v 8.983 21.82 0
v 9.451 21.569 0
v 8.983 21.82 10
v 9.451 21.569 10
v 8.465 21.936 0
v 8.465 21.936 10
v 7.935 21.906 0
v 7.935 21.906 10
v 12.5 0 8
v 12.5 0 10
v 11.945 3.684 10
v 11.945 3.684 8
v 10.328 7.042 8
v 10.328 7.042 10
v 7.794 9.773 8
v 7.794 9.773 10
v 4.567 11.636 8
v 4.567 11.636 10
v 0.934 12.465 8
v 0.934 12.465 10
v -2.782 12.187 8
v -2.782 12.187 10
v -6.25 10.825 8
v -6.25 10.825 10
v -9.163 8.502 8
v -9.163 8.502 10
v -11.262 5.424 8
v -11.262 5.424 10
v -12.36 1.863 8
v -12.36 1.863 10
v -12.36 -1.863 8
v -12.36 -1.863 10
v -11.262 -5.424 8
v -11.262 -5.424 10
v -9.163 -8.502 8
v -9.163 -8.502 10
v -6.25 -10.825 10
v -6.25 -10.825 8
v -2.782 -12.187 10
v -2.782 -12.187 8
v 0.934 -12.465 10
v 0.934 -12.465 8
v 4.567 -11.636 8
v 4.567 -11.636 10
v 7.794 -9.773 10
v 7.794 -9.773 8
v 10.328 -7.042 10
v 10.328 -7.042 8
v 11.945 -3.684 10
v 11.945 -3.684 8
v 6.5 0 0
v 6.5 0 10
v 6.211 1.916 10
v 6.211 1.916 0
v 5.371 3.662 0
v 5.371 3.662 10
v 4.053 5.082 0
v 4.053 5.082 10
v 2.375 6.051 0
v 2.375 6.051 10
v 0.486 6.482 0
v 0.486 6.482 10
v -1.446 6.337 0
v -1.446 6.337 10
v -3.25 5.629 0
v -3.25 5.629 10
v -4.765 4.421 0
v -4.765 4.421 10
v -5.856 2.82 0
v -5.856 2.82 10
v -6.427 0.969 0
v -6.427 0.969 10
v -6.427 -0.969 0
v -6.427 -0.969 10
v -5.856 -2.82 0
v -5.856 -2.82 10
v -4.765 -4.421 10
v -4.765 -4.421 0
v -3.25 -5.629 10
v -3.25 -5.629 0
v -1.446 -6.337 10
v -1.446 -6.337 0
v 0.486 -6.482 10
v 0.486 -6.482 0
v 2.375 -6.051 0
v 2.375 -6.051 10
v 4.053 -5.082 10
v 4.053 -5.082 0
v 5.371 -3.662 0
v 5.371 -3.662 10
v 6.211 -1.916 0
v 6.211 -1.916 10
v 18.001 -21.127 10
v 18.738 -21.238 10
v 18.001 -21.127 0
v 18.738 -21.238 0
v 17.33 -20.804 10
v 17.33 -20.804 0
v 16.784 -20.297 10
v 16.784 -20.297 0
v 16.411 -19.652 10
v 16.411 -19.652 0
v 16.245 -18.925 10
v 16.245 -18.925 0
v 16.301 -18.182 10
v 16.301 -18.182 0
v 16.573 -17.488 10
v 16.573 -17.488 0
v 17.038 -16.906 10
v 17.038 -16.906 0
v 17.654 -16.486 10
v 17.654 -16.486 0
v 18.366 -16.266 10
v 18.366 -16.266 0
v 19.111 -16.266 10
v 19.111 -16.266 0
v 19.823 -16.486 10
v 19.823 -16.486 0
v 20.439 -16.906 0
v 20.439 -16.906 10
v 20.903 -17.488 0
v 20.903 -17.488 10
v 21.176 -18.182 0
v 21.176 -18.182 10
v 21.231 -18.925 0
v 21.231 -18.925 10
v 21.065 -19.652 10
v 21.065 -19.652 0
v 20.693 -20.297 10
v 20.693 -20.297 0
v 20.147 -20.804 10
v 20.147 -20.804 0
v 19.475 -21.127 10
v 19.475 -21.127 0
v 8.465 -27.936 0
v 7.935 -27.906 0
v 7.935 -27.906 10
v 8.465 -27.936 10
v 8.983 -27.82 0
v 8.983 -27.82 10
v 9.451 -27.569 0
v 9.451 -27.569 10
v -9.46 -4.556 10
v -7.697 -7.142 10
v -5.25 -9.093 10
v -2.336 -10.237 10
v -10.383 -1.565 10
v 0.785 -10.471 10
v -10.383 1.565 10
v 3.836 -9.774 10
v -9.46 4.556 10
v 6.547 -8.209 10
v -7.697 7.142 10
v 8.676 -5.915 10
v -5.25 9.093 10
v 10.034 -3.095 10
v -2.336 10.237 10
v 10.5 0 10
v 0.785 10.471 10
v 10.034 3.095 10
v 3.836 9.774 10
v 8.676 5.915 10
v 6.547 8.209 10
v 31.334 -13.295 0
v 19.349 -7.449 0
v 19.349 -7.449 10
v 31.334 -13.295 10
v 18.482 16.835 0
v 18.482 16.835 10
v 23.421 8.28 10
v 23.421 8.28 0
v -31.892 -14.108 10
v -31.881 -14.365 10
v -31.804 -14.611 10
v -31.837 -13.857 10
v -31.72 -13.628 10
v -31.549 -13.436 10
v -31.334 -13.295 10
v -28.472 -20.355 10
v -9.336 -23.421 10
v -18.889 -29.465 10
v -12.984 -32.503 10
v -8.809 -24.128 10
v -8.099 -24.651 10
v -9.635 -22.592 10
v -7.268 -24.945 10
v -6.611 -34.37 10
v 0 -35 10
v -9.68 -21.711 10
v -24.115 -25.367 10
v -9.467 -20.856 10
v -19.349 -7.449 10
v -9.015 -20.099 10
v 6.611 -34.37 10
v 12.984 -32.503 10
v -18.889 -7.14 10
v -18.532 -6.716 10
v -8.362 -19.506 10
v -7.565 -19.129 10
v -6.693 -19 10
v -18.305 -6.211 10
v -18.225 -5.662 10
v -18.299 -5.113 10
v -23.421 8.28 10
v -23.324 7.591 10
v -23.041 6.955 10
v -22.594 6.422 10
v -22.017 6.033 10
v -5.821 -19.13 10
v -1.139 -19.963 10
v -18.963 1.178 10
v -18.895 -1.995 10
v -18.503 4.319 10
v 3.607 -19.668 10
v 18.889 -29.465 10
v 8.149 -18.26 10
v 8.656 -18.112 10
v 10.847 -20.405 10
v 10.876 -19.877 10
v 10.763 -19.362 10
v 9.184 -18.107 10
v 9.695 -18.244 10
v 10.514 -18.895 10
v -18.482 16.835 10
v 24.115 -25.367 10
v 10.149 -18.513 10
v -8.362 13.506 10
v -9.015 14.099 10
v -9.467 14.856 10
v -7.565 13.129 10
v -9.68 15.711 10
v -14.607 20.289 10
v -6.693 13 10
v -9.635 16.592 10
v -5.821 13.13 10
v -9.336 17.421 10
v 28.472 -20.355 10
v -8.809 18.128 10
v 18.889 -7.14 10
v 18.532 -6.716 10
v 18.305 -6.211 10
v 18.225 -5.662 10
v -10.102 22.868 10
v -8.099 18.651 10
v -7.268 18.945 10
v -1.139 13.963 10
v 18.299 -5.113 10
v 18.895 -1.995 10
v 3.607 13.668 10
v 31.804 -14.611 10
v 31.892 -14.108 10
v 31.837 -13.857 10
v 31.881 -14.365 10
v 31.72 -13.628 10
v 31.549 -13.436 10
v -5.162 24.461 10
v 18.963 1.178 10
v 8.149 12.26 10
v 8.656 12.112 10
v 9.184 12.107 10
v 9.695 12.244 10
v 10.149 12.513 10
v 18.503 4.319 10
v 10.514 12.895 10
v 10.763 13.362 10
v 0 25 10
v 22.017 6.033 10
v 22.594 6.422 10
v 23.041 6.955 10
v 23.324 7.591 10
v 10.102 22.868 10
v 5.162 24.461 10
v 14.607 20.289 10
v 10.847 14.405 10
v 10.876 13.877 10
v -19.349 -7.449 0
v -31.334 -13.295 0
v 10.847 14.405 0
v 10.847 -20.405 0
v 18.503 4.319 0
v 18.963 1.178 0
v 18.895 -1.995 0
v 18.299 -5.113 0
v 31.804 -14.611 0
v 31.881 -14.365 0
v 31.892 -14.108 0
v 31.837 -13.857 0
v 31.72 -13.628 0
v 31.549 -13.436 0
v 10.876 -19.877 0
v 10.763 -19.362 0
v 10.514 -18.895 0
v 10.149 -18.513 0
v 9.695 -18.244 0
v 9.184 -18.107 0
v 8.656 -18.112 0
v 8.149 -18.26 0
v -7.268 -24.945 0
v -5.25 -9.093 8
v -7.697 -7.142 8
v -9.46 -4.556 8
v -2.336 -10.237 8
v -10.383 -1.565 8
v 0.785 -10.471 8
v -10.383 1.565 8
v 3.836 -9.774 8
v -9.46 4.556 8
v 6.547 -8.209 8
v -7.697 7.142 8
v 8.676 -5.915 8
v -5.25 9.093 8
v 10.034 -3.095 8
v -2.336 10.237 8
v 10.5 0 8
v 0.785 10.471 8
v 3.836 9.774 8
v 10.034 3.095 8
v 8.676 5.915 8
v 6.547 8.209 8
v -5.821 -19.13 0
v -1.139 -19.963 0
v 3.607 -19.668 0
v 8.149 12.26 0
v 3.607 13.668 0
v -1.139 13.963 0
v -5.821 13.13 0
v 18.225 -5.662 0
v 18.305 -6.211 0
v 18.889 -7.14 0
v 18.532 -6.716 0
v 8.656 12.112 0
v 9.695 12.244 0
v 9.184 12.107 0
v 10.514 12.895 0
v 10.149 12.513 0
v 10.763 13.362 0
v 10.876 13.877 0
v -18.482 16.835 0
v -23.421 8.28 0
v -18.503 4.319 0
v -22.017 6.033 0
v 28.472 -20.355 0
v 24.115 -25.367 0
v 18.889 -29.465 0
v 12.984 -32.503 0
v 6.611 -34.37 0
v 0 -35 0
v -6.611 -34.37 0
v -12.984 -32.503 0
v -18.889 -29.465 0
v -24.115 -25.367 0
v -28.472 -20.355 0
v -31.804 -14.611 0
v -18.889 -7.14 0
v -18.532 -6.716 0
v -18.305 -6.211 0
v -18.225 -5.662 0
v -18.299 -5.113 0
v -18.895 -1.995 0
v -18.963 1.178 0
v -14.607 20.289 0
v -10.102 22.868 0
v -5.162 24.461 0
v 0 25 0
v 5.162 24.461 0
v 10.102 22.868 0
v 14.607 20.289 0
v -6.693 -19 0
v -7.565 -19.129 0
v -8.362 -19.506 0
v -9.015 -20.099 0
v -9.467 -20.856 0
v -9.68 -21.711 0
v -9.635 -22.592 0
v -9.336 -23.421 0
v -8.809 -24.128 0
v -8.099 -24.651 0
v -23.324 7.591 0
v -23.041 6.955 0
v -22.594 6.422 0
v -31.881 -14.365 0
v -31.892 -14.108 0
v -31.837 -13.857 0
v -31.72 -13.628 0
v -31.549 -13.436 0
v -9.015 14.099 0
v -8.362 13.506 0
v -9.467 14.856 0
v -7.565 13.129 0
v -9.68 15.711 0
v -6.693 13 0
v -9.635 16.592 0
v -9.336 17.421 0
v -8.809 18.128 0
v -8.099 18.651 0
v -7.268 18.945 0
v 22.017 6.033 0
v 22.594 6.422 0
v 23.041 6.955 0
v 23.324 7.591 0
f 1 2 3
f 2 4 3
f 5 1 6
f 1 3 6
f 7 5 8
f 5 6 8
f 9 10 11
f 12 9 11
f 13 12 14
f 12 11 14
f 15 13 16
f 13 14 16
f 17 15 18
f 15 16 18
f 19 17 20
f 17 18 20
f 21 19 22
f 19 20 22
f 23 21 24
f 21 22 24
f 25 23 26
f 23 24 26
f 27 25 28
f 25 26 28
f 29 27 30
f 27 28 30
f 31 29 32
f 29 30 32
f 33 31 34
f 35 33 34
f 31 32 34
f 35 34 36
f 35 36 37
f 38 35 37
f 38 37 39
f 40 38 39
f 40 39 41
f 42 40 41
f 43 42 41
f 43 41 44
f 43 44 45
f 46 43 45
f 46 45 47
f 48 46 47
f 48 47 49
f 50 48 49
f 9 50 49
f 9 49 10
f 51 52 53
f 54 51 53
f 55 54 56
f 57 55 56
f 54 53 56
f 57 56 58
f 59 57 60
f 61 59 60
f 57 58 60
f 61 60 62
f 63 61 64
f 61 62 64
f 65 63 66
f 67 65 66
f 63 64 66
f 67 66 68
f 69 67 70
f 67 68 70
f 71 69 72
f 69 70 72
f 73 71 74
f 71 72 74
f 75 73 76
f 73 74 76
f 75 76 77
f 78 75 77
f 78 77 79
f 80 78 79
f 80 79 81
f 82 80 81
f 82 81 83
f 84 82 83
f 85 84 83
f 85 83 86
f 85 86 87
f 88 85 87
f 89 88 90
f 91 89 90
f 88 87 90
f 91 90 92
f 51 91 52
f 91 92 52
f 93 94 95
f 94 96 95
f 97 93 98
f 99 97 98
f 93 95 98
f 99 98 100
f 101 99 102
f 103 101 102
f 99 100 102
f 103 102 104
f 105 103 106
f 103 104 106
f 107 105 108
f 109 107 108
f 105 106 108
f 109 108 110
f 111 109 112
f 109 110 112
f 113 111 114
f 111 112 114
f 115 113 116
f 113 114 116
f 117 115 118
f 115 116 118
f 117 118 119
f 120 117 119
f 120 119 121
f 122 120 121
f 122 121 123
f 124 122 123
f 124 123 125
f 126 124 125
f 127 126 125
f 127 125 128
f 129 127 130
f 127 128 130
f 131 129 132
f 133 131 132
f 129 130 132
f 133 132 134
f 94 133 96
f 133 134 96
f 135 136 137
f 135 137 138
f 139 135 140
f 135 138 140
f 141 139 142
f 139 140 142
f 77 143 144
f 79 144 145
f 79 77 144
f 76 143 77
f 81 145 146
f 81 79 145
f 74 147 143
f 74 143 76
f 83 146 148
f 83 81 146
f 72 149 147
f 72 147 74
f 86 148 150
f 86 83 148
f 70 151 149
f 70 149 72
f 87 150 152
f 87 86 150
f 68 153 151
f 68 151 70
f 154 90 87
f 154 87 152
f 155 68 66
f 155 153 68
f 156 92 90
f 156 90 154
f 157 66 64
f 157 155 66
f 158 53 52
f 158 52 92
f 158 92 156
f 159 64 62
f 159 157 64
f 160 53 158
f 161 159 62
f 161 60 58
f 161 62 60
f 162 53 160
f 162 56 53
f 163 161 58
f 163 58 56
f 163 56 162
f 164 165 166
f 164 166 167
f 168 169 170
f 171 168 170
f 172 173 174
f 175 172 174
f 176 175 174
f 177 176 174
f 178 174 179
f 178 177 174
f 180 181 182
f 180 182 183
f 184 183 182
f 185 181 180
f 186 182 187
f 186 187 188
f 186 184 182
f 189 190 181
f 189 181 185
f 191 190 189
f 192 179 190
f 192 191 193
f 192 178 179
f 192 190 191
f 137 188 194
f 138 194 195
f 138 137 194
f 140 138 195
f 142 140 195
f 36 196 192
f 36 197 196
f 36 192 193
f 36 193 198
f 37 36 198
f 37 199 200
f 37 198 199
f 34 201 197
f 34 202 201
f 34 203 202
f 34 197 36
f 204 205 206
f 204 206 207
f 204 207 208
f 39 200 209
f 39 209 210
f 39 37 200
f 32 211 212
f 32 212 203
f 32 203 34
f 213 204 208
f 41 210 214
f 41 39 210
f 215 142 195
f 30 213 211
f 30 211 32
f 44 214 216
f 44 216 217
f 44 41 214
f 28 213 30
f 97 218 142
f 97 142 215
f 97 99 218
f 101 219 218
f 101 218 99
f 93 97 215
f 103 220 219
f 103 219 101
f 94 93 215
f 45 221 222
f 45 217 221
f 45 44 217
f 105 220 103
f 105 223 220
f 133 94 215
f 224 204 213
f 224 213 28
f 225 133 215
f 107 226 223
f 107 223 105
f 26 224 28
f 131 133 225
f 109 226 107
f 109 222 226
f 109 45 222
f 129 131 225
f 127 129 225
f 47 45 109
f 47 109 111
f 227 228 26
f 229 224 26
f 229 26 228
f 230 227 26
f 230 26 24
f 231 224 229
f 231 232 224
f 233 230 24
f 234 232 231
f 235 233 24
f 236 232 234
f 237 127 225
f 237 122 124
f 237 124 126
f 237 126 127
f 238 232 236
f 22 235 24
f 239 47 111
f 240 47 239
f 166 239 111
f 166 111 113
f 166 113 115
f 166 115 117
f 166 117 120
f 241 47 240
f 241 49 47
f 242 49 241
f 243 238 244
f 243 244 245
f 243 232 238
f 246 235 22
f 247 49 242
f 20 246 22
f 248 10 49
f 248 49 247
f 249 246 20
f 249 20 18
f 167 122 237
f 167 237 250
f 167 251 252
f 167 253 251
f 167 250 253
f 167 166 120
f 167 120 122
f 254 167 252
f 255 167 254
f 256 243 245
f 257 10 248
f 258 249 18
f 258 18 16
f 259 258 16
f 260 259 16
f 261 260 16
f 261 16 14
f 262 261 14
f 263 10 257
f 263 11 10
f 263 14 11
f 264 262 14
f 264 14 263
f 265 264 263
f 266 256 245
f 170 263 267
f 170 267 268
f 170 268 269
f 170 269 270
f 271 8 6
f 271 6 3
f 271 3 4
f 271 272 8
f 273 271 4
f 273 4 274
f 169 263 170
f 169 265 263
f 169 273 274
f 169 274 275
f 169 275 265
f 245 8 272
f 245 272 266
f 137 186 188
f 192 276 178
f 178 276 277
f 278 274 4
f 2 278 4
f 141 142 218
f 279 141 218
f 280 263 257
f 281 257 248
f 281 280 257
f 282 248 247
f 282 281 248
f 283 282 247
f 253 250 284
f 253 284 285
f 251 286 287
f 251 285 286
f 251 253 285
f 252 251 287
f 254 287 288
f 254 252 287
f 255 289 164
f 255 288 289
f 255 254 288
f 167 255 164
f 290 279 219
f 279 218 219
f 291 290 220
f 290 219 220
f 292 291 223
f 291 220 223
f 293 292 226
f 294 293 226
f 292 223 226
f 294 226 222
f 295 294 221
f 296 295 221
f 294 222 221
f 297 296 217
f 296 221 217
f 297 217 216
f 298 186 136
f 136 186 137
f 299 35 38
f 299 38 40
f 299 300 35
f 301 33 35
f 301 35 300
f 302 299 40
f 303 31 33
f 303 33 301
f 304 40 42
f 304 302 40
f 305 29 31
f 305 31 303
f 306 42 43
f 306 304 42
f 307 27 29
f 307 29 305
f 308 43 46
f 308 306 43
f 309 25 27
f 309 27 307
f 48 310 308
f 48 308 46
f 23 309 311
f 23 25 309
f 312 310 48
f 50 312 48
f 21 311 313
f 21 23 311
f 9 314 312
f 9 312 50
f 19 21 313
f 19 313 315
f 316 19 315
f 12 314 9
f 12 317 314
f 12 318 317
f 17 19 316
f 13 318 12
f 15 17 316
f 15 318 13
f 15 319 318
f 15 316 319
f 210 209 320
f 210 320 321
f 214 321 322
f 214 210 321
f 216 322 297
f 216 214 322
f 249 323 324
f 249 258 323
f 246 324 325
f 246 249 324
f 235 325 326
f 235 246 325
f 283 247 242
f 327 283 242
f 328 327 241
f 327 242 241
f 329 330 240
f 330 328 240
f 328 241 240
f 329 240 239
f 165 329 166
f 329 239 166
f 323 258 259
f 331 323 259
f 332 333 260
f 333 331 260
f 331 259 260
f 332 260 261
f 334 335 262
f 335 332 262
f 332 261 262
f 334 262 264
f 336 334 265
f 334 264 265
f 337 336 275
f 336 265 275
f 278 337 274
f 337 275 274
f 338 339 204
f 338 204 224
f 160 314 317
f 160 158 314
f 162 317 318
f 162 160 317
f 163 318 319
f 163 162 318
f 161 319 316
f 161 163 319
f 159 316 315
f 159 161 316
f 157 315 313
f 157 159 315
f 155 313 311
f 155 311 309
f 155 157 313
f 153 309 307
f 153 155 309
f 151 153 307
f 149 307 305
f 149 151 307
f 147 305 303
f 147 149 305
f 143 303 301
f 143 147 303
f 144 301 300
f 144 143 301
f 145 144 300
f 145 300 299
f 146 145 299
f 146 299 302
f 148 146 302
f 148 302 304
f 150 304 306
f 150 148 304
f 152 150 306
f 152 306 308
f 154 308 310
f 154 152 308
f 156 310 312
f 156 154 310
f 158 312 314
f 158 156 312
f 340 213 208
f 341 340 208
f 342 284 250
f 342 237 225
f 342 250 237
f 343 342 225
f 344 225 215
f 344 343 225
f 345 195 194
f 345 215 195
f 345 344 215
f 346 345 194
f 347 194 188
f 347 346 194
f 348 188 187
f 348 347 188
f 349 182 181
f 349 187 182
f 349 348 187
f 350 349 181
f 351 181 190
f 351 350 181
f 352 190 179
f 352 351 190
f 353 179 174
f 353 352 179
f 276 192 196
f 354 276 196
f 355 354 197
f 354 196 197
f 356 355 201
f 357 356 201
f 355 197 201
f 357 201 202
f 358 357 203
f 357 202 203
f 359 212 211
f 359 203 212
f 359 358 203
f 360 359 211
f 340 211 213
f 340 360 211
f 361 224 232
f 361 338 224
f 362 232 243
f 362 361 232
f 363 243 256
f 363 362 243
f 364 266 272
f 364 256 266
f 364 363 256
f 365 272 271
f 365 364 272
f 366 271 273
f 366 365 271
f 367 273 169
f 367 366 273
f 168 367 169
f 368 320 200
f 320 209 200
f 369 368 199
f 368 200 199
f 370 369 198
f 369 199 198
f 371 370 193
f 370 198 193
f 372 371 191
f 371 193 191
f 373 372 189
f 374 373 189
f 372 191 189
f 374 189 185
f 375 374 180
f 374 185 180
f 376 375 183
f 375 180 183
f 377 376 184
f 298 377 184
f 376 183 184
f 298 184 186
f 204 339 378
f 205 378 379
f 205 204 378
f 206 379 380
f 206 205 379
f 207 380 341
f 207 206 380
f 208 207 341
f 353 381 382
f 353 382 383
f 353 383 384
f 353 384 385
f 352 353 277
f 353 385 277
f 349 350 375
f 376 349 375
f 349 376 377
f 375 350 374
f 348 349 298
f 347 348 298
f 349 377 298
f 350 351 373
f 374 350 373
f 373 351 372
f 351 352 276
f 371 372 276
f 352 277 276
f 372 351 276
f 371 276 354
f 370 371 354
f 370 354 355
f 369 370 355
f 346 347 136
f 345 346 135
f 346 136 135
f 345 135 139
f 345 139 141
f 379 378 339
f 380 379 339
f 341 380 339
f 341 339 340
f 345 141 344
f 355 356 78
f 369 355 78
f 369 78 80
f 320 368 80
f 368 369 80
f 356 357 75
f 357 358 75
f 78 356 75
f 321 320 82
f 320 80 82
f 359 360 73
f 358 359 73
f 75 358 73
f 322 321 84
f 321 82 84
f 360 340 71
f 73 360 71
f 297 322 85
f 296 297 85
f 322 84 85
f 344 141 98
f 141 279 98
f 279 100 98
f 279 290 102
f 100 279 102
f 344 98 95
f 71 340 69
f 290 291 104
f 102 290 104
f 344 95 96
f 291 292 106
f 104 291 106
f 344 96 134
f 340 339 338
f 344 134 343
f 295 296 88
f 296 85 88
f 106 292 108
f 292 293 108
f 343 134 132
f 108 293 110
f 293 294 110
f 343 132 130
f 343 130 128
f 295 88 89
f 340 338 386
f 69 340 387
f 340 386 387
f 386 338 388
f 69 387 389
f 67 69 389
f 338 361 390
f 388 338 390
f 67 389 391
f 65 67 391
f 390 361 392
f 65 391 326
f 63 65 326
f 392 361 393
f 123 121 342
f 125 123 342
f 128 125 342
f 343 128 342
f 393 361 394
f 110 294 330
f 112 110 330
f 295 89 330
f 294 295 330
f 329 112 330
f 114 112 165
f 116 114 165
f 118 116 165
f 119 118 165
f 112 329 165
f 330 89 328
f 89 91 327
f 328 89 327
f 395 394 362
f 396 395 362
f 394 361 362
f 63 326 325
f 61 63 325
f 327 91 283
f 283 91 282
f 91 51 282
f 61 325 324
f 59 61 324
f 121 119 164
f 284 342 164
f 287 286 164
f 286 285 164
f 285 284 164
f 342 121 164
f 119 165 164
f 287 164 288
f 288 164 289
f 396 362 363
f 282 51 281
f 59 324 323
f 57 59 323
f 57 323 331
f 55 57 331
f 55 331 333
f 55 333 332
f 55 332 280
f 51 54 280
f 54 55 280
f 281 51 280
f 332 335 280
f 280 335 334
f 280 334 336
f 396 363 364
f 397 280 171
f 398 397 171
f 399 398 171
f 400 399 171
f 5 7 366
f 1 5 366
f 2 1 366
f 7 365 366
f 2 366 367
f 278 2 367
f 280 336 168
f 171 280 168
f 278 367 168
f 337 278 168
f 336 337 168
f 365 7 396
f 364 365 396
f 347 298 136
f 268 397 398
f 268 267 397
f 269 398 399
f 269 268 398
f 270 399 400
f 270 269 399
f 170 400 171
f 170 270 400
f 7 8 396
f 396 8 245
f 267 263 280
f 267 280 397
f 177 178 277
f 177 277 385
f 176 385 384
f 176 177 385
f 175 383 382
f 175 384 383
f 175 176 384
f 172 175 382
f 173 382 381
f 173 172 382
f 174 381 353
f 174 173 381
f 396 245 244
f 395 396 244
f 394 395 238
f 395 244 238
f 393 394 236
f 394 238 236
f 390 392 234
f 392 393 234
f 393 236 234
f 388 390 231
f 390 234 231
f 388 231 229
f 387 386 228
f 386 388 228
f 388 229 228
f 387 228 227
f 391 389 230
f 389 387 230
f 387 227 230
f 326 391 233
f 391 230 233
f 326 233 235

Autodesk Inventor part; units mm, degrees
ref_plane "XY Plane" through (0, 0, 0) normal (0, 0, 1) x (1, 0, 0)
sketch "Skizze1" plane through (0, 0, 0) normal (0, 0, 1) x (1, 0, 0)
  line L0 (0, 25) -> (0, -35) construction
  line L1 (-32.2, 0) -> (32.2, 0) construction
  circle A0 centre (0, 0) radius 19
  line L2 (-18.5027, 4.3188) -> (-24, 7)
  line L3 (-17.7846, -6.6863) -> (-32.2, -13.7171)
  line L4 (18.5027, 4.3188) -> (24, 7)
  line L5 (17.7846, -6.6863) -> (32.2, -13.7171)
  arc A1 (-32.2, -13.7171) -> (32.2, -13.7171) centre (0, 0) ccw
  arc A2 (24, 7) -> (-24, 7) centre (0, 0) ccw
  dimension "d3" = 38
  dimension "d4" = 26
  dimension "d5" = 52
  dimension "d6" = 26
  dimension "d7" = 52
  dimension "d8" = 48
  dimension "d9" = 64.4
  dimension "d10" = 60
  dimension "d11" = 25
extrude "Extrusion1" add sketch "Skizze1" along normal blind 10
fillet "Rundung1" radius 2.5 2 edges at (24, 7, 5) (-24, 7, 5)
sketch "Skizze2" plane through (0, 0, 10) normal (0, 0, 1) x (1, 0, 0)
  line L0 (0, 0) -> (24.7487, -24.7487) construction
  arc A0 (-32.2, -13.7171) -> (32.2, -13.7171) centre (0, 0) ccw projected
  line L1 (0, 0) -> (35, 0) construction
  point P0 (18.7383, -18.7383)
  dimension "d15" = 45
  dimension "d16" = 26.5
hole "Bohrung1" at (18.7383, -18.7383, 10) direction (0, 0, -1) diameter 5 end through all
fillet "Rundung2" radius 1 2 edges at (32.2, -13.7171, 5) (-32.2, -13.7171, 5)
fillet "Rundung3" radius 2 2 edges at (17.7846, -6.6863, 5) (-17.7846, -6.6863, 5)
sketch "Skizze3" plane through (0, 0, 10) normal (0, 0, 1) x (1, 0, 0)
  arc A0 (-23.2457, 9.1998) -> (-22.0171, 6.0329) centre (-20.9211, 8.2798) ccw projected
  line L0 (-23.4211, 8.2798) -> (-23.4211, 29.6928) construction
  line L1 (-23.4211, 8.2798) -> (-18.4816, 16.8354)
  line L2 (-23.4211, 8.2798) -> (-11.3111, 8.2798) construction
  arc A1 (23.2457, 9.1998) -> (-23.2457, 9.1998) centre (0, 0) ccw projected
  dimension "d27" = 30
extrude "Extrusion2" cut sketch "Skizze3" against normal through all
ref_plane "Arbeitsebene1" through (0, 0, 0) normal (1, 0, 0) x (0, 1, 0)
mirror "Spiegeln1" about plane through (0, 0, 0) normal (1, 0, 0) of "Extrusion2"
sketch "Skizze4" plane through (0, 0, 10) normal (0, 0, 1) x (1, 0, 0)
  circle A0 centre (0, 0) radius 6.5
  dimension "d31" = 13
extrude "Extrusion3" cut sketch "Skizze4" against normal blind 10
sketch "Skizze5" plane through (0, 0, 10) normal (0, 0, 1) x (1, 0, 0)
  circle A0 centre (0, 0) radius 10.5
  circle A1 centre (0, 0) radius 12.5
  dimension "d34" = 21
  dimension "d35" = 25
extrude "Extrusion4" cut sketch "Skizze5" against normal blind 2
sketch "Skizze6" plane through (0, 0, 10) normal (0, 0, 1) x (1, 0, 0)
  arc A0 (-5.8207, -19.1299) -> (-7.2677, -24.9446) centre (-6.694, -22) ccw
  line L0 (-7.2677, -24.9446) -> (7.9346, -27.9063)
  arc A1 (7.9346, -27.9063) -> (9.4512, -27.5686) centre (8.306, -26) ccw
  line L1 (9.4512, -27.5686) -> (10.8468, -20.405)
  arc A2 (10.8468, -20.405) -> (8.1489, -18.2601) centre (8.9404, -20.0336) ccw
  arc A3 (-5.8207, -19.1299) -> (8.1489, -18.2601) centre (0, 0) ccw
  circle A4 centre (0, 0) radius 12.5 projected
  line L2 (0, 0) -> (0, -16.1046) construction
  dimension "d38" = 15
  dimension "d40" = 6
  dimension "d41" = 3
  dimension "d42" = 19.9959
  dimension "d43" = 22
  dimension "d44" = 26
  dimension "d45" = 20.0336
extrude "Extrusion5" cut sketch "Skizze6" against normal up to surface (10 mm away) contours A3 A2 L1 A1 L0 A0
ref_plane "Arbeitsebene2" through (0, -3, 0) normal (0, 1, 0) x (-1, 0, 0)
mirror "Spiegeln2" about plane through (0, -3, 0) normal (0, 1, 0) of "Extrusion5"
properties part number "disc" material "Stahl, galvanisiert"
